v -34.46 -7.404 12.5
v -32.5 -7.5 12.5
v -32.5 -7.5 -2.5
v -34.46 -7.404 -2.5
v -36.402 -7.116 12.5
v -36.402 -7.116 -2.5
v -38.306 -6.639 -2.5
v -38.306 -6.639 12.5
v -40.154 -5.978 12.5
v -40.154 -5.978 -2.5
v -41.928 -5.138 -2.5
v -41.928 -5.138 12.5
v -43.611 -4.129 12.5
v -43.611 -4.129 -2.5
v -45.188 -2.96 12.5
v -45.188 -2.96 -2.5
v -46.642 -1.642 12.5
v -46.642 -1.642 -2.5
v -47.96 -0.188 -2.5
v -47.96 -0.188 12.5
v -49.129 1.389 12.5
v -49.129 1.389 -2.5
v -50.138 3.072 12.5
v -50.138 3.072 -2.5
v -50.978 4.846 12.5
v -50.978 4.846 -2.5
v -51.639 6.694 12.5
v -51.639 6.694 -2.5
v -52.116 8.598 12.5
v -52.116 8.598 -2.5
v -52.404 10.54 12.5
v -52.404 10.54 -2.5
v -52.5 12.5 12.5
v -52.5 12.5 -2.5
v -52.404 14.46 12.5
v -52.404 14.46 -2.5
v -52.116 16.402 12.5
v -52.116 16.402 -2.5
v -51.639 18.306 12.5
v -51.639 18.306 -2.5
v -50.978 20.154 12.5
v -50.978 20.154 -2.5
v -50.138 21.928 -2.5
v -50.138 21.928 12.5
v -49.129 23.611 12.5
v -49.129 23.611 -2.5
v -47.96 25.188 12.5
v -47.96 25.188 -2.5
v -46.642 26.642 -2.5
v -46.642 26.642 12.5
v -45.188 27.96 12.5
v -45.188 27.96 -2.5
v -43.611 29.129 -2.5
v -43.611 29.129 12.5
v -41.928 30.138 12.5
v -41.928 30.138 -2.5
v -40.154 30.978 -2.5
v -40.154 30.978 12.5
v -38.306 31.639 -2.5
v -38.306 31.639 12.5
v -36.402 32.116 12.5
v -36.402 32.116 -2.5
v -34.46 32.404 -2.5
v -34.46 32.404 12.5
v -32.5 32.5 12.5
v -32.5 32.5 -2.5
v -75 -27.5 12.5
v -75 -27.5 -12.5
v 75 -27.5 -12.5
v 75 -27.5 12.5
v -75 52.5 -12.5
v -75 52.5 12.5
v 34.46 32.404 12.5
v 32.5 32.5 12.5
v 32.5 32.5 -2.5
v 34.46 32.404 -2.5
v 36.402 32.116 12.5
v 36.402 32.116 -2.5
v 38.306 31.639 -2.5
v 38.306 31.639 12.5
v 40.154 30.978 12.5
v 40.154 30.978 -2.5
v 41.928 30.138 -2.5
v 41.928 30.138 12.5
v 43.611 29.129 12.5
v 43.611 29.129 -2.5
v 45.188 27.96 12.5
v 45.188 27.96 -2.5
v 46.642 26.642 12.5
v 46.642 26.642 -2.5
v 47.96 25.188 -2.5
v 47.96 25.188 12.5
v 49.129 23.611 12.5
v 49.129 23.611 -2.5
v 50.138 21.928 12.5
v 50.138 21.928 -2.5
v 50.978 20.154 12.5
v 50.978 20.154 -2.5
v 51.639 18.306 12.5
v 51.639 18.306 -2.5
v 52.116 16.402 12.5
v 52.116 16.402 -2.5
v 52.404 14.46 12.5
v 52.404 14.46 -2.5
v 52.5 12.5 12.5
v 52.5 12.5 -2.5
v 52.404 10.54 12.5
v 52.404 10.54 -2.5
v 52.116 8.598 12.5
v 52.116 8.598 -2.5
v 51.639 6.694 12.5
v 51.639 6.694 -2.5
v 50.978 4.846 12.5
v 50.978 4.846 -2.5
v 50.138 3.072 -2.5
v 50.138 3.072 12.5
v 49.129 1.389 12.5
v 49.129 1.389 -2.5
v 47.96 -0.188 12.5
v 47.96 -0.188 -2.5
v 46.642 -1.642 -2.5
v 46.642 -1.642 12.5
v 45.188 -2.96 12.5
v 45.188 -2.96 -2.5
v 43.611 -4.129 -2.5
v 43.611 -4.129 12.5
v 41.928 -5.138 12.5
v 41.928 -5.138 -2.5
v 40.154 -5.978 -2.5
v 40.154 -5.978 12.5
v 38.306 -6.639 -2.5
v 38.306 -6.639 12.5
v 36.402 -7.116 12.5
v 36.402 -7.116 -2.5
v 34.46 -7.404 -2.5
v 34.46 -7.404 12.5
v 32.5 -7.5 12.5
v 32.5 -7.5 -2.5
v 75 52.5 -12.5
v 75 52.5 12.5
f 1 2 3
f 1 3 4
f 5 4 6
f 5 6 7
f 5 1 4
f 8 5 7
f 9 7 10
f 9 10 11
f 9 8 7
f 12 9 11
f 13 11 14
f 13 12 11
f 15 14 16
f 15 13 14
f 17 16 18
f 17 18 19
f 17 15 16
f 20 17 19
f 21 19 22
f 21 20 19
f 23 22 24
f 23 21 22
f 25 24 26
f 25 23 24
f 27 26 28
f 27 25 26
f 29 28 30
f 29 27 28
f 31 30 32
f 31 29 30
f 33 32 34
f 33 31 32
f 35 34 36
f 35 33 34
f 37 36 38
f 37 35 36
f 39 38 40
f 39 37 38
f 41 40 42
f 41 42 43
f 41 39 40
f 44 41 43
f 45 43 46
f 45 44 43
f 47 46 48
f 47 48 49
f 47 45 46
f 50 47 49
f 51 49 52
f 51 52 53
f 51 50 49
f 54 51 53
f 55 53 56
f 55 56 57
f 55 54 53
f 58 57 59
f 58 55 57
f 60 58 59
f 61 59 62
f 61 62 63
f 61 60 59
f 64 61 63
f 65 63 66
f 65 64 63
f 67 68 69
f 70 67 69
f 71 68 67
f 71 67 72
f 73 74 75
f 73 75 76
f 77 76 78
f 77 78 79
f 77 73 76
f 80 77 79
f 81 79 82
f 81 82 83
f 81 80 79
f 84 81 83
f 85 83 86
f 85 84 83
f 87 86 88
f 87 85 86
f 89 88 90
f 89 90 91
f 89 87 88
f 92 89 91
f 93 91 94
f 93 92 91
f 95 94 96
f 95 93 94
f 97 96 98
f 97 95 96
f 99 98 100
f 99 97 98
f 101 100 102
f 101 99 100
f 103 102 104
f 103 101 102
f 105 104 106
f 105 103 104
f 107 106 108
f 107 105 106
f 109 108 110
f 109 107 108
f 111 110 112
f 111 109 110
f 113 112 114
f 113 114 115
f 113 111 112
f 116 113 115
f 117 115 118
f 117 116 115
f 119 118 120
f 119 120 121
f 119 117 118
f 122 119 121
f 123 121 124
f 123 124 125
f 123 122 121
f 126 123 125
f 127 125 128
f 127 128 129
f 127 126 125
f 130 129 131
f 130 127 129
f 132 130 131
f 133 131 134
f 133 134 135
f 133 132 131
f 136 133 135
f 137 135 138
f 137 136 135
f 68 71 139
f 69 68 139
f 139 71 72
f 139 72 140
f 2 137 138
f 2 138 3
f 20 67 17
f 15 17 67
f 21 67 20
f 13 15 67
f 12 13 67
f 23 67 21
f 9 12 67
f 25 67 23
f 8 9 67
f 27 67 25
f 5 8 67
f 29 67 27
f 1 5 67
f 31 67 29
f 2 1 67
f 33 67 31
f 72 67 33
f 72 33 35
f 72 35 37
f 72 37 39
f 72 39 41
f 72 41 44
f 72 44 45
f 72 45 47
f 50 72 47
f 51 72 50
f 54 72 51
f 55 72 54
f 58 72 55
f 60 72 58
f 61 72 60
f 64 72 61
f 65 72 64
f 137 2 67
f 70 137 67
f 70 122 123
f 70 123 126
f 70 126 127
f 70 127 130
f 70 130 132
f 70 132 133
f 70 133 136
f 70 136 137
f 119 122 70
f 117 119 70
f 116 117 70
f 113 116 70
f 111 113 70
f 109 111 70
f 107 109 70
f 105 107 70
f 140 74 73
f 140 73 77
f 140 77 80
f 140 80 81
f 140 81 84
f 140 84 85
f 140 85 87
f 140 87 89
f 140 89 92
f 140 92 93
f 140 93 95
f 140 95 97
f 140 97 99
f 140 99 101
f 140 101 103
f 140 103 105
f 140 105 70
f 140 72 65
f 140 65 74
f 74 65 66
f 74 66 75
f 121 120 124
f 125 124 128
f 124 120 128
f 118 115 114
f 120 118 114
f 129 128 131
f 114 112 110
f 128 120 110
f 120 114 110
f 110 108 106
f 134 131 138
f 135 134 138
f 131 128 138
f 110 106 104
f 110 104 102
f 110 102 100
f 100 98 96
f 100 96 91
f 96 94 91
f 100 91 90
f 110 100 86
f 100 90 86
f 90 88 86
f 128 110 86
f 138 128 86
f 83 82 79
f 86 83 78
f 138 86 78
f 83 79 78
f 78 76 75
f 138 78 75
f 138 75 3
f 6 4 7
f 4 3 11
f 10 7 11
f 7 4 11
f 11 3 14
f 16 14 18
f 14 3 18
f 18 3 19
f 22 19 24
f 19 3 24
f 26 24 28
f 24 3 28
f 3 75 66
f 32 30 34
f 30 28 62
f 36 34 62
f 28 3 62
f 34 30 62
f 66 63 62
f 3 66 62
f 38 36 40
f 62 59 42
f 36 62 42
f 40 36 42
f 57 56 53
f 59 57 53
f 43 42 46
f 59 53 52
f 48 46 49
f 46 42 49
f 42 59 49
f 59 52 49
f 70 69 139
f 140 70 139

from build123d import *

# Parameters (mm, degrees)
SKETCH_1_W          = 150
SKETCH_1_H          = 80
EXTRUDE_1_DEPTH     = 25
CUT_EXTRUDE_1_DEPTH = 15
MOVE_BODY_1_ANGLE   = 90


with BuildPart() as part:
    # 草图1 → 凸台-拉伸1 (new body)
    with BuildSketch(Plane(origin=(0, 0, 0), x_dir=(1, 0, 0), z_dir=(0, 1, 0))):
        Rectangle(SKETCH_1_W, SKETCH_1_H)
    extrude(amount=EXTRUDE_1_DEPTH)

    # 草图2 → 切除-拉伸1 (cut)
    with BuildSketch(Plane(origin=(0, 25, 0), x_dir=(1, 0, 0), z_dir=(0, 1, 0))):
        with BuildLine():
            Line((-32.5, 20), (32.5, 20))
            ThreePointArc((32.5, 20), (52.5, 0), (32.5, -20))
            Line((32.5, -20), (-32.5, -20))
            ThreePointArc((-32.5, -20), (-52.5, 0), (-32.5, 20))
        make_face()
    extrude(amount=-CUT_EXTRUDE_1_DEPTH, mode=Mode.SUBTRACT)


with BuildPart() as part_1:
    # Move Body 1: moved
    add(part.part.rotate(Axis((0, 12.5, 0), (1, 0, 0)), MOVE_BODY_1_ANGLE))


solid = part_1.part
